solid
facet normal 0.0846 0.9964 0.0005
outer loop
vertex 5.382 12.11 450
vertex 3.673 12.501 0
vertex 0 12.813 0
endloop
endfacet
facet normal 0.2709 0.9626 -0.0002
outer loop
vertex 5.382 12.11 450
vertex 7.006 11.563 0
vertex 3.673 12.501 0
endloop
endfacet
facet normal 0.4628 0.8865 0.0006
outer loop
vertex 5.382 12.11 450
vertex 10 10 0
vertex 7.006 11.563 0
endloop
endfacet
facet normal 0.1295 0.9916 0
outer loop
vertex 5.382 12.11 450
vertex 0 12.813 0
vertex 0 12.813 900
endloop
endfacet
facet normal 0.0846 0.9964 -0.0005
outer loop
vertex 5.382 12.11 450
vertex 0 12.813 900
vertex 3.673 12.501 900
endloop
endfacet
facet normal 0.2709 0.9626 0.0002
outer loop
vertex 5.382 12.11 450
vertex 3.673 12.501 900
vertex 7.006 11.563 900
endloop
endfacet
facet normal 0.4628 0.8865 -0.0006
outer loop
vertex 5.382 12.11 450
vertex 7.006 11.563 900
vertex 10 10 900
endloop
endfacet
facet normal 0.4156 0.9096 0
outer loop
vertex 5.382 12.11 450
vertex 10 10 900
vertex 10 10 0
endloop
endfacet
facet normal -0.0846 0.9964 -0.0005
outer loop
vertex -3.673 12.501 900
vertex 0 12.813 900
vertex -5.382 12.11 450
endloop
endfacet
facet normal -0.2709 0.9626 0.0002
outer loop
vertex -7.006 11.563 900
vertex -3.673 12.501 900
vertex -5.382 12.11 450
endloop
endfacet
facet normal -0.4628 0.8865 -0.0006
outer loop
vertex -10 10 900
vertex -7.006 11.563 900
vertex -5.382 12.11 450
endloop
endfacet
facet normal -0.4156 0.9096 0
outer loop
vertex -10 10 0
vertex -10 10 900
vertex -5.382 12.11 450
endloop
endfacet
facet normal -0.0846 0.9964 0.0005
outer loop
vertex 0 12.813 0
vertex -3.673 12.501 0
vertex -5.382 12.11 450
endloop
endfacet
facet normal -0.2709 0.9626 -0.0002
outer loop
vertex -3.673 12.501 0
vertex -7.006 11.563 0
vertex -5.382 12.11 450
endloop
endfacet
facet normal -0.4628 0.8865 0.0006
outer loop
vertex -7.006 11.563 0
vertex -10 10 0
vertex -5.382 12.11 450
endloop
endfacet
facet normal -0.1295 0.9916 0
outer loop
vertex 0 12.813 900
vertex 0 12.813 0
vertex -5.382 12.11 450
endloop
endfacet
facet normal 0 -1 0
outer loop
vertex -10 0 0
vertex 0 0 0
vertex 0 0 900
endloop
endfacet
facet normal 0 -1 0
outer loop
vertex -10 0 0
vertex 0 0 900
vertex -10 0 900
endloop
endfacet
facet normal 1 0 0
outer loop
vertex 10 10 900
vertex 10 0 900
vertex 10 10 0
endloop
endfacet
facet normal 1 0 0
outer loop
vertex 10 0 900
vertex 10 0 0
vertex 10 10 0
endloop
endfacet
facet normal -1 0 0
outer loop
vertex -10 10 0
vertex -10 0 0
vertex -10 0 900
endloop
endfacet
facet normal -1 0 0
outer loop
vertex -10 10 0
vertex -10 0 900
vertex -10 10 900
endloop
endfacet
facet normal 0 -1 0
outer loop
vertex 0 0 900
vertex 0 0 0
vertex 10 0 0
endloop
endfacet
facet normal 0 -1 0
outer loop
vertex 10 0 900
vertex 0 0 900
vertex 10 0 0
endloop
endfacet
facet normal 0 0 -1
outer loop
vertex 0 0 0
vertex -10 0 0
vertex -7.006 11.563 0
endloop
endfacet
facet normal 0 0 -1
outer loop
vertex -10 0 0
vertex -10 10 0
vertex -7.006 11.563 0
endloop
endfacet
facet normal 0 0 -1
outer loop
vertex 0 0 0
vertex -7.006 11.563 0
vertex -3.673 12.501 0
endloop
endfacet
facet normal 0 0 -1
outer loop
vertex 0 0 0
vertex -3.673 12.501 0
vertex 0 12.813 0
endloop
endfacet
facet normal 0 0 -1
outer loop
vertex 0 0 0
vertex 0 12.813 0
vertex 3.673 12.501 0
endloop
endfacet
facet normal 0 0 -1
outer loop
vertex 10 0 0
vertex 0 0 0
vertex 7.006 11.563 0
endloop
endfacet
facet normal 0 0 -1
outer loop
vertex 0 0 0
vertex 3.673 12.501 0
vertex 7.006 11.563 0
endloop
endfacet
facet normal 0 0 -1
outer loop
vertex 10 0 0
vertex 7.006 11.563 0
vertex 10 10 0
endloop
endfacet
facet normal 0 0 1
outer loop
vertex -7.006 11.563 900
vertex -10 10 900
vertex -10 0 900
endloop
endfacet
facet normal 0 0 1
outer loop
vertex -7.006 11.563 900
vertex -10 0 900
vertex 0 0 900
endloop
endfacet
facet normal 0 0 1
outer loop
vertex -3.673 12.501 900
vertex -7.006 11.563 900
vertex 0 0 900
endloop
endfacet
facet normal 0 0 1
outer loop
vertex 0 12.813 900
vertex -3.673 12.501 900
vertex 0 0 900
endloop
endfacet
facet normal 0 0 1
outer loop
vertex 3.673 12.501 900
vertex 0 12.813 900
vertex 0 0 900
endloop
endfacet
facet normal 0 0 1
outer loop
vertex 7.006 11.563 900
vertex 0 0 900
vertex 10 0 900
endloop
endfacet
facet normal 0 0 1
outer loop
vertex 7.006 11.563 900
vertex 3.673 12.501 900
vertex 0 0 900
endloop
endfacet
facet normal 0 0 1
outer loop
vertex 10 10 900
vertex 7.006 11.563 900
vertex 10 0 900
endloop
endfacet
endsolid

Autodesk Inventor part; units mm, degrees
ref_plane "YZ Plane" through (0, 0, 0) normal (1, 0, 0) x (0, 1, 0)
ref_plane "XZ Plane" through (0, 0, 0) normal (0, 1, 0) x (-1, 0, 0)
ref_plane "XY Plane" through (0, 0, 0) normal (0, 0, 1) x (1, 0, 0)
sketch "Sketch1" plane through (0, 0, 0) normal (0, 0, 1) x (1, 0, 0)
  line L0 (0, 12.8132) -> (5.7633, 12.8132) construction
  line L1 (5.7633, 12.8132) -> (10, 10) construction
  spline S0 degree 2 poles (0, 12.8132) (5.7633, 12.8132) (10, 10) knots 1 1 1 2 2 2
  line L2 (0, 0) -> (10, 0)
  line L3 (10, 0) -> (10, 10)
  line L4 (0, 13.9209) -> (0, -2.5018) construction
  line L5 (0, 12.8132) -> (-5.7633, 12.8132) construction
  line L6 (-5.7633, 12.8132) -> (-10, 10) construction
  spline S1 degree 2 poles (0, 12.8132) (-5.7633, 12.8132) (-10, 10) knots 1 1 1 2 2 2
  line L7 (0, 0) -> (-10, 0)
  line L8 (-10, 0) -> (-10, 10)
  dimension "d0" = 10
  dimension "d1" = 10
extrude "Extrusion1" add sketch "Sketch1" along normal blind 900
properties part number "CentreBackCushion"
